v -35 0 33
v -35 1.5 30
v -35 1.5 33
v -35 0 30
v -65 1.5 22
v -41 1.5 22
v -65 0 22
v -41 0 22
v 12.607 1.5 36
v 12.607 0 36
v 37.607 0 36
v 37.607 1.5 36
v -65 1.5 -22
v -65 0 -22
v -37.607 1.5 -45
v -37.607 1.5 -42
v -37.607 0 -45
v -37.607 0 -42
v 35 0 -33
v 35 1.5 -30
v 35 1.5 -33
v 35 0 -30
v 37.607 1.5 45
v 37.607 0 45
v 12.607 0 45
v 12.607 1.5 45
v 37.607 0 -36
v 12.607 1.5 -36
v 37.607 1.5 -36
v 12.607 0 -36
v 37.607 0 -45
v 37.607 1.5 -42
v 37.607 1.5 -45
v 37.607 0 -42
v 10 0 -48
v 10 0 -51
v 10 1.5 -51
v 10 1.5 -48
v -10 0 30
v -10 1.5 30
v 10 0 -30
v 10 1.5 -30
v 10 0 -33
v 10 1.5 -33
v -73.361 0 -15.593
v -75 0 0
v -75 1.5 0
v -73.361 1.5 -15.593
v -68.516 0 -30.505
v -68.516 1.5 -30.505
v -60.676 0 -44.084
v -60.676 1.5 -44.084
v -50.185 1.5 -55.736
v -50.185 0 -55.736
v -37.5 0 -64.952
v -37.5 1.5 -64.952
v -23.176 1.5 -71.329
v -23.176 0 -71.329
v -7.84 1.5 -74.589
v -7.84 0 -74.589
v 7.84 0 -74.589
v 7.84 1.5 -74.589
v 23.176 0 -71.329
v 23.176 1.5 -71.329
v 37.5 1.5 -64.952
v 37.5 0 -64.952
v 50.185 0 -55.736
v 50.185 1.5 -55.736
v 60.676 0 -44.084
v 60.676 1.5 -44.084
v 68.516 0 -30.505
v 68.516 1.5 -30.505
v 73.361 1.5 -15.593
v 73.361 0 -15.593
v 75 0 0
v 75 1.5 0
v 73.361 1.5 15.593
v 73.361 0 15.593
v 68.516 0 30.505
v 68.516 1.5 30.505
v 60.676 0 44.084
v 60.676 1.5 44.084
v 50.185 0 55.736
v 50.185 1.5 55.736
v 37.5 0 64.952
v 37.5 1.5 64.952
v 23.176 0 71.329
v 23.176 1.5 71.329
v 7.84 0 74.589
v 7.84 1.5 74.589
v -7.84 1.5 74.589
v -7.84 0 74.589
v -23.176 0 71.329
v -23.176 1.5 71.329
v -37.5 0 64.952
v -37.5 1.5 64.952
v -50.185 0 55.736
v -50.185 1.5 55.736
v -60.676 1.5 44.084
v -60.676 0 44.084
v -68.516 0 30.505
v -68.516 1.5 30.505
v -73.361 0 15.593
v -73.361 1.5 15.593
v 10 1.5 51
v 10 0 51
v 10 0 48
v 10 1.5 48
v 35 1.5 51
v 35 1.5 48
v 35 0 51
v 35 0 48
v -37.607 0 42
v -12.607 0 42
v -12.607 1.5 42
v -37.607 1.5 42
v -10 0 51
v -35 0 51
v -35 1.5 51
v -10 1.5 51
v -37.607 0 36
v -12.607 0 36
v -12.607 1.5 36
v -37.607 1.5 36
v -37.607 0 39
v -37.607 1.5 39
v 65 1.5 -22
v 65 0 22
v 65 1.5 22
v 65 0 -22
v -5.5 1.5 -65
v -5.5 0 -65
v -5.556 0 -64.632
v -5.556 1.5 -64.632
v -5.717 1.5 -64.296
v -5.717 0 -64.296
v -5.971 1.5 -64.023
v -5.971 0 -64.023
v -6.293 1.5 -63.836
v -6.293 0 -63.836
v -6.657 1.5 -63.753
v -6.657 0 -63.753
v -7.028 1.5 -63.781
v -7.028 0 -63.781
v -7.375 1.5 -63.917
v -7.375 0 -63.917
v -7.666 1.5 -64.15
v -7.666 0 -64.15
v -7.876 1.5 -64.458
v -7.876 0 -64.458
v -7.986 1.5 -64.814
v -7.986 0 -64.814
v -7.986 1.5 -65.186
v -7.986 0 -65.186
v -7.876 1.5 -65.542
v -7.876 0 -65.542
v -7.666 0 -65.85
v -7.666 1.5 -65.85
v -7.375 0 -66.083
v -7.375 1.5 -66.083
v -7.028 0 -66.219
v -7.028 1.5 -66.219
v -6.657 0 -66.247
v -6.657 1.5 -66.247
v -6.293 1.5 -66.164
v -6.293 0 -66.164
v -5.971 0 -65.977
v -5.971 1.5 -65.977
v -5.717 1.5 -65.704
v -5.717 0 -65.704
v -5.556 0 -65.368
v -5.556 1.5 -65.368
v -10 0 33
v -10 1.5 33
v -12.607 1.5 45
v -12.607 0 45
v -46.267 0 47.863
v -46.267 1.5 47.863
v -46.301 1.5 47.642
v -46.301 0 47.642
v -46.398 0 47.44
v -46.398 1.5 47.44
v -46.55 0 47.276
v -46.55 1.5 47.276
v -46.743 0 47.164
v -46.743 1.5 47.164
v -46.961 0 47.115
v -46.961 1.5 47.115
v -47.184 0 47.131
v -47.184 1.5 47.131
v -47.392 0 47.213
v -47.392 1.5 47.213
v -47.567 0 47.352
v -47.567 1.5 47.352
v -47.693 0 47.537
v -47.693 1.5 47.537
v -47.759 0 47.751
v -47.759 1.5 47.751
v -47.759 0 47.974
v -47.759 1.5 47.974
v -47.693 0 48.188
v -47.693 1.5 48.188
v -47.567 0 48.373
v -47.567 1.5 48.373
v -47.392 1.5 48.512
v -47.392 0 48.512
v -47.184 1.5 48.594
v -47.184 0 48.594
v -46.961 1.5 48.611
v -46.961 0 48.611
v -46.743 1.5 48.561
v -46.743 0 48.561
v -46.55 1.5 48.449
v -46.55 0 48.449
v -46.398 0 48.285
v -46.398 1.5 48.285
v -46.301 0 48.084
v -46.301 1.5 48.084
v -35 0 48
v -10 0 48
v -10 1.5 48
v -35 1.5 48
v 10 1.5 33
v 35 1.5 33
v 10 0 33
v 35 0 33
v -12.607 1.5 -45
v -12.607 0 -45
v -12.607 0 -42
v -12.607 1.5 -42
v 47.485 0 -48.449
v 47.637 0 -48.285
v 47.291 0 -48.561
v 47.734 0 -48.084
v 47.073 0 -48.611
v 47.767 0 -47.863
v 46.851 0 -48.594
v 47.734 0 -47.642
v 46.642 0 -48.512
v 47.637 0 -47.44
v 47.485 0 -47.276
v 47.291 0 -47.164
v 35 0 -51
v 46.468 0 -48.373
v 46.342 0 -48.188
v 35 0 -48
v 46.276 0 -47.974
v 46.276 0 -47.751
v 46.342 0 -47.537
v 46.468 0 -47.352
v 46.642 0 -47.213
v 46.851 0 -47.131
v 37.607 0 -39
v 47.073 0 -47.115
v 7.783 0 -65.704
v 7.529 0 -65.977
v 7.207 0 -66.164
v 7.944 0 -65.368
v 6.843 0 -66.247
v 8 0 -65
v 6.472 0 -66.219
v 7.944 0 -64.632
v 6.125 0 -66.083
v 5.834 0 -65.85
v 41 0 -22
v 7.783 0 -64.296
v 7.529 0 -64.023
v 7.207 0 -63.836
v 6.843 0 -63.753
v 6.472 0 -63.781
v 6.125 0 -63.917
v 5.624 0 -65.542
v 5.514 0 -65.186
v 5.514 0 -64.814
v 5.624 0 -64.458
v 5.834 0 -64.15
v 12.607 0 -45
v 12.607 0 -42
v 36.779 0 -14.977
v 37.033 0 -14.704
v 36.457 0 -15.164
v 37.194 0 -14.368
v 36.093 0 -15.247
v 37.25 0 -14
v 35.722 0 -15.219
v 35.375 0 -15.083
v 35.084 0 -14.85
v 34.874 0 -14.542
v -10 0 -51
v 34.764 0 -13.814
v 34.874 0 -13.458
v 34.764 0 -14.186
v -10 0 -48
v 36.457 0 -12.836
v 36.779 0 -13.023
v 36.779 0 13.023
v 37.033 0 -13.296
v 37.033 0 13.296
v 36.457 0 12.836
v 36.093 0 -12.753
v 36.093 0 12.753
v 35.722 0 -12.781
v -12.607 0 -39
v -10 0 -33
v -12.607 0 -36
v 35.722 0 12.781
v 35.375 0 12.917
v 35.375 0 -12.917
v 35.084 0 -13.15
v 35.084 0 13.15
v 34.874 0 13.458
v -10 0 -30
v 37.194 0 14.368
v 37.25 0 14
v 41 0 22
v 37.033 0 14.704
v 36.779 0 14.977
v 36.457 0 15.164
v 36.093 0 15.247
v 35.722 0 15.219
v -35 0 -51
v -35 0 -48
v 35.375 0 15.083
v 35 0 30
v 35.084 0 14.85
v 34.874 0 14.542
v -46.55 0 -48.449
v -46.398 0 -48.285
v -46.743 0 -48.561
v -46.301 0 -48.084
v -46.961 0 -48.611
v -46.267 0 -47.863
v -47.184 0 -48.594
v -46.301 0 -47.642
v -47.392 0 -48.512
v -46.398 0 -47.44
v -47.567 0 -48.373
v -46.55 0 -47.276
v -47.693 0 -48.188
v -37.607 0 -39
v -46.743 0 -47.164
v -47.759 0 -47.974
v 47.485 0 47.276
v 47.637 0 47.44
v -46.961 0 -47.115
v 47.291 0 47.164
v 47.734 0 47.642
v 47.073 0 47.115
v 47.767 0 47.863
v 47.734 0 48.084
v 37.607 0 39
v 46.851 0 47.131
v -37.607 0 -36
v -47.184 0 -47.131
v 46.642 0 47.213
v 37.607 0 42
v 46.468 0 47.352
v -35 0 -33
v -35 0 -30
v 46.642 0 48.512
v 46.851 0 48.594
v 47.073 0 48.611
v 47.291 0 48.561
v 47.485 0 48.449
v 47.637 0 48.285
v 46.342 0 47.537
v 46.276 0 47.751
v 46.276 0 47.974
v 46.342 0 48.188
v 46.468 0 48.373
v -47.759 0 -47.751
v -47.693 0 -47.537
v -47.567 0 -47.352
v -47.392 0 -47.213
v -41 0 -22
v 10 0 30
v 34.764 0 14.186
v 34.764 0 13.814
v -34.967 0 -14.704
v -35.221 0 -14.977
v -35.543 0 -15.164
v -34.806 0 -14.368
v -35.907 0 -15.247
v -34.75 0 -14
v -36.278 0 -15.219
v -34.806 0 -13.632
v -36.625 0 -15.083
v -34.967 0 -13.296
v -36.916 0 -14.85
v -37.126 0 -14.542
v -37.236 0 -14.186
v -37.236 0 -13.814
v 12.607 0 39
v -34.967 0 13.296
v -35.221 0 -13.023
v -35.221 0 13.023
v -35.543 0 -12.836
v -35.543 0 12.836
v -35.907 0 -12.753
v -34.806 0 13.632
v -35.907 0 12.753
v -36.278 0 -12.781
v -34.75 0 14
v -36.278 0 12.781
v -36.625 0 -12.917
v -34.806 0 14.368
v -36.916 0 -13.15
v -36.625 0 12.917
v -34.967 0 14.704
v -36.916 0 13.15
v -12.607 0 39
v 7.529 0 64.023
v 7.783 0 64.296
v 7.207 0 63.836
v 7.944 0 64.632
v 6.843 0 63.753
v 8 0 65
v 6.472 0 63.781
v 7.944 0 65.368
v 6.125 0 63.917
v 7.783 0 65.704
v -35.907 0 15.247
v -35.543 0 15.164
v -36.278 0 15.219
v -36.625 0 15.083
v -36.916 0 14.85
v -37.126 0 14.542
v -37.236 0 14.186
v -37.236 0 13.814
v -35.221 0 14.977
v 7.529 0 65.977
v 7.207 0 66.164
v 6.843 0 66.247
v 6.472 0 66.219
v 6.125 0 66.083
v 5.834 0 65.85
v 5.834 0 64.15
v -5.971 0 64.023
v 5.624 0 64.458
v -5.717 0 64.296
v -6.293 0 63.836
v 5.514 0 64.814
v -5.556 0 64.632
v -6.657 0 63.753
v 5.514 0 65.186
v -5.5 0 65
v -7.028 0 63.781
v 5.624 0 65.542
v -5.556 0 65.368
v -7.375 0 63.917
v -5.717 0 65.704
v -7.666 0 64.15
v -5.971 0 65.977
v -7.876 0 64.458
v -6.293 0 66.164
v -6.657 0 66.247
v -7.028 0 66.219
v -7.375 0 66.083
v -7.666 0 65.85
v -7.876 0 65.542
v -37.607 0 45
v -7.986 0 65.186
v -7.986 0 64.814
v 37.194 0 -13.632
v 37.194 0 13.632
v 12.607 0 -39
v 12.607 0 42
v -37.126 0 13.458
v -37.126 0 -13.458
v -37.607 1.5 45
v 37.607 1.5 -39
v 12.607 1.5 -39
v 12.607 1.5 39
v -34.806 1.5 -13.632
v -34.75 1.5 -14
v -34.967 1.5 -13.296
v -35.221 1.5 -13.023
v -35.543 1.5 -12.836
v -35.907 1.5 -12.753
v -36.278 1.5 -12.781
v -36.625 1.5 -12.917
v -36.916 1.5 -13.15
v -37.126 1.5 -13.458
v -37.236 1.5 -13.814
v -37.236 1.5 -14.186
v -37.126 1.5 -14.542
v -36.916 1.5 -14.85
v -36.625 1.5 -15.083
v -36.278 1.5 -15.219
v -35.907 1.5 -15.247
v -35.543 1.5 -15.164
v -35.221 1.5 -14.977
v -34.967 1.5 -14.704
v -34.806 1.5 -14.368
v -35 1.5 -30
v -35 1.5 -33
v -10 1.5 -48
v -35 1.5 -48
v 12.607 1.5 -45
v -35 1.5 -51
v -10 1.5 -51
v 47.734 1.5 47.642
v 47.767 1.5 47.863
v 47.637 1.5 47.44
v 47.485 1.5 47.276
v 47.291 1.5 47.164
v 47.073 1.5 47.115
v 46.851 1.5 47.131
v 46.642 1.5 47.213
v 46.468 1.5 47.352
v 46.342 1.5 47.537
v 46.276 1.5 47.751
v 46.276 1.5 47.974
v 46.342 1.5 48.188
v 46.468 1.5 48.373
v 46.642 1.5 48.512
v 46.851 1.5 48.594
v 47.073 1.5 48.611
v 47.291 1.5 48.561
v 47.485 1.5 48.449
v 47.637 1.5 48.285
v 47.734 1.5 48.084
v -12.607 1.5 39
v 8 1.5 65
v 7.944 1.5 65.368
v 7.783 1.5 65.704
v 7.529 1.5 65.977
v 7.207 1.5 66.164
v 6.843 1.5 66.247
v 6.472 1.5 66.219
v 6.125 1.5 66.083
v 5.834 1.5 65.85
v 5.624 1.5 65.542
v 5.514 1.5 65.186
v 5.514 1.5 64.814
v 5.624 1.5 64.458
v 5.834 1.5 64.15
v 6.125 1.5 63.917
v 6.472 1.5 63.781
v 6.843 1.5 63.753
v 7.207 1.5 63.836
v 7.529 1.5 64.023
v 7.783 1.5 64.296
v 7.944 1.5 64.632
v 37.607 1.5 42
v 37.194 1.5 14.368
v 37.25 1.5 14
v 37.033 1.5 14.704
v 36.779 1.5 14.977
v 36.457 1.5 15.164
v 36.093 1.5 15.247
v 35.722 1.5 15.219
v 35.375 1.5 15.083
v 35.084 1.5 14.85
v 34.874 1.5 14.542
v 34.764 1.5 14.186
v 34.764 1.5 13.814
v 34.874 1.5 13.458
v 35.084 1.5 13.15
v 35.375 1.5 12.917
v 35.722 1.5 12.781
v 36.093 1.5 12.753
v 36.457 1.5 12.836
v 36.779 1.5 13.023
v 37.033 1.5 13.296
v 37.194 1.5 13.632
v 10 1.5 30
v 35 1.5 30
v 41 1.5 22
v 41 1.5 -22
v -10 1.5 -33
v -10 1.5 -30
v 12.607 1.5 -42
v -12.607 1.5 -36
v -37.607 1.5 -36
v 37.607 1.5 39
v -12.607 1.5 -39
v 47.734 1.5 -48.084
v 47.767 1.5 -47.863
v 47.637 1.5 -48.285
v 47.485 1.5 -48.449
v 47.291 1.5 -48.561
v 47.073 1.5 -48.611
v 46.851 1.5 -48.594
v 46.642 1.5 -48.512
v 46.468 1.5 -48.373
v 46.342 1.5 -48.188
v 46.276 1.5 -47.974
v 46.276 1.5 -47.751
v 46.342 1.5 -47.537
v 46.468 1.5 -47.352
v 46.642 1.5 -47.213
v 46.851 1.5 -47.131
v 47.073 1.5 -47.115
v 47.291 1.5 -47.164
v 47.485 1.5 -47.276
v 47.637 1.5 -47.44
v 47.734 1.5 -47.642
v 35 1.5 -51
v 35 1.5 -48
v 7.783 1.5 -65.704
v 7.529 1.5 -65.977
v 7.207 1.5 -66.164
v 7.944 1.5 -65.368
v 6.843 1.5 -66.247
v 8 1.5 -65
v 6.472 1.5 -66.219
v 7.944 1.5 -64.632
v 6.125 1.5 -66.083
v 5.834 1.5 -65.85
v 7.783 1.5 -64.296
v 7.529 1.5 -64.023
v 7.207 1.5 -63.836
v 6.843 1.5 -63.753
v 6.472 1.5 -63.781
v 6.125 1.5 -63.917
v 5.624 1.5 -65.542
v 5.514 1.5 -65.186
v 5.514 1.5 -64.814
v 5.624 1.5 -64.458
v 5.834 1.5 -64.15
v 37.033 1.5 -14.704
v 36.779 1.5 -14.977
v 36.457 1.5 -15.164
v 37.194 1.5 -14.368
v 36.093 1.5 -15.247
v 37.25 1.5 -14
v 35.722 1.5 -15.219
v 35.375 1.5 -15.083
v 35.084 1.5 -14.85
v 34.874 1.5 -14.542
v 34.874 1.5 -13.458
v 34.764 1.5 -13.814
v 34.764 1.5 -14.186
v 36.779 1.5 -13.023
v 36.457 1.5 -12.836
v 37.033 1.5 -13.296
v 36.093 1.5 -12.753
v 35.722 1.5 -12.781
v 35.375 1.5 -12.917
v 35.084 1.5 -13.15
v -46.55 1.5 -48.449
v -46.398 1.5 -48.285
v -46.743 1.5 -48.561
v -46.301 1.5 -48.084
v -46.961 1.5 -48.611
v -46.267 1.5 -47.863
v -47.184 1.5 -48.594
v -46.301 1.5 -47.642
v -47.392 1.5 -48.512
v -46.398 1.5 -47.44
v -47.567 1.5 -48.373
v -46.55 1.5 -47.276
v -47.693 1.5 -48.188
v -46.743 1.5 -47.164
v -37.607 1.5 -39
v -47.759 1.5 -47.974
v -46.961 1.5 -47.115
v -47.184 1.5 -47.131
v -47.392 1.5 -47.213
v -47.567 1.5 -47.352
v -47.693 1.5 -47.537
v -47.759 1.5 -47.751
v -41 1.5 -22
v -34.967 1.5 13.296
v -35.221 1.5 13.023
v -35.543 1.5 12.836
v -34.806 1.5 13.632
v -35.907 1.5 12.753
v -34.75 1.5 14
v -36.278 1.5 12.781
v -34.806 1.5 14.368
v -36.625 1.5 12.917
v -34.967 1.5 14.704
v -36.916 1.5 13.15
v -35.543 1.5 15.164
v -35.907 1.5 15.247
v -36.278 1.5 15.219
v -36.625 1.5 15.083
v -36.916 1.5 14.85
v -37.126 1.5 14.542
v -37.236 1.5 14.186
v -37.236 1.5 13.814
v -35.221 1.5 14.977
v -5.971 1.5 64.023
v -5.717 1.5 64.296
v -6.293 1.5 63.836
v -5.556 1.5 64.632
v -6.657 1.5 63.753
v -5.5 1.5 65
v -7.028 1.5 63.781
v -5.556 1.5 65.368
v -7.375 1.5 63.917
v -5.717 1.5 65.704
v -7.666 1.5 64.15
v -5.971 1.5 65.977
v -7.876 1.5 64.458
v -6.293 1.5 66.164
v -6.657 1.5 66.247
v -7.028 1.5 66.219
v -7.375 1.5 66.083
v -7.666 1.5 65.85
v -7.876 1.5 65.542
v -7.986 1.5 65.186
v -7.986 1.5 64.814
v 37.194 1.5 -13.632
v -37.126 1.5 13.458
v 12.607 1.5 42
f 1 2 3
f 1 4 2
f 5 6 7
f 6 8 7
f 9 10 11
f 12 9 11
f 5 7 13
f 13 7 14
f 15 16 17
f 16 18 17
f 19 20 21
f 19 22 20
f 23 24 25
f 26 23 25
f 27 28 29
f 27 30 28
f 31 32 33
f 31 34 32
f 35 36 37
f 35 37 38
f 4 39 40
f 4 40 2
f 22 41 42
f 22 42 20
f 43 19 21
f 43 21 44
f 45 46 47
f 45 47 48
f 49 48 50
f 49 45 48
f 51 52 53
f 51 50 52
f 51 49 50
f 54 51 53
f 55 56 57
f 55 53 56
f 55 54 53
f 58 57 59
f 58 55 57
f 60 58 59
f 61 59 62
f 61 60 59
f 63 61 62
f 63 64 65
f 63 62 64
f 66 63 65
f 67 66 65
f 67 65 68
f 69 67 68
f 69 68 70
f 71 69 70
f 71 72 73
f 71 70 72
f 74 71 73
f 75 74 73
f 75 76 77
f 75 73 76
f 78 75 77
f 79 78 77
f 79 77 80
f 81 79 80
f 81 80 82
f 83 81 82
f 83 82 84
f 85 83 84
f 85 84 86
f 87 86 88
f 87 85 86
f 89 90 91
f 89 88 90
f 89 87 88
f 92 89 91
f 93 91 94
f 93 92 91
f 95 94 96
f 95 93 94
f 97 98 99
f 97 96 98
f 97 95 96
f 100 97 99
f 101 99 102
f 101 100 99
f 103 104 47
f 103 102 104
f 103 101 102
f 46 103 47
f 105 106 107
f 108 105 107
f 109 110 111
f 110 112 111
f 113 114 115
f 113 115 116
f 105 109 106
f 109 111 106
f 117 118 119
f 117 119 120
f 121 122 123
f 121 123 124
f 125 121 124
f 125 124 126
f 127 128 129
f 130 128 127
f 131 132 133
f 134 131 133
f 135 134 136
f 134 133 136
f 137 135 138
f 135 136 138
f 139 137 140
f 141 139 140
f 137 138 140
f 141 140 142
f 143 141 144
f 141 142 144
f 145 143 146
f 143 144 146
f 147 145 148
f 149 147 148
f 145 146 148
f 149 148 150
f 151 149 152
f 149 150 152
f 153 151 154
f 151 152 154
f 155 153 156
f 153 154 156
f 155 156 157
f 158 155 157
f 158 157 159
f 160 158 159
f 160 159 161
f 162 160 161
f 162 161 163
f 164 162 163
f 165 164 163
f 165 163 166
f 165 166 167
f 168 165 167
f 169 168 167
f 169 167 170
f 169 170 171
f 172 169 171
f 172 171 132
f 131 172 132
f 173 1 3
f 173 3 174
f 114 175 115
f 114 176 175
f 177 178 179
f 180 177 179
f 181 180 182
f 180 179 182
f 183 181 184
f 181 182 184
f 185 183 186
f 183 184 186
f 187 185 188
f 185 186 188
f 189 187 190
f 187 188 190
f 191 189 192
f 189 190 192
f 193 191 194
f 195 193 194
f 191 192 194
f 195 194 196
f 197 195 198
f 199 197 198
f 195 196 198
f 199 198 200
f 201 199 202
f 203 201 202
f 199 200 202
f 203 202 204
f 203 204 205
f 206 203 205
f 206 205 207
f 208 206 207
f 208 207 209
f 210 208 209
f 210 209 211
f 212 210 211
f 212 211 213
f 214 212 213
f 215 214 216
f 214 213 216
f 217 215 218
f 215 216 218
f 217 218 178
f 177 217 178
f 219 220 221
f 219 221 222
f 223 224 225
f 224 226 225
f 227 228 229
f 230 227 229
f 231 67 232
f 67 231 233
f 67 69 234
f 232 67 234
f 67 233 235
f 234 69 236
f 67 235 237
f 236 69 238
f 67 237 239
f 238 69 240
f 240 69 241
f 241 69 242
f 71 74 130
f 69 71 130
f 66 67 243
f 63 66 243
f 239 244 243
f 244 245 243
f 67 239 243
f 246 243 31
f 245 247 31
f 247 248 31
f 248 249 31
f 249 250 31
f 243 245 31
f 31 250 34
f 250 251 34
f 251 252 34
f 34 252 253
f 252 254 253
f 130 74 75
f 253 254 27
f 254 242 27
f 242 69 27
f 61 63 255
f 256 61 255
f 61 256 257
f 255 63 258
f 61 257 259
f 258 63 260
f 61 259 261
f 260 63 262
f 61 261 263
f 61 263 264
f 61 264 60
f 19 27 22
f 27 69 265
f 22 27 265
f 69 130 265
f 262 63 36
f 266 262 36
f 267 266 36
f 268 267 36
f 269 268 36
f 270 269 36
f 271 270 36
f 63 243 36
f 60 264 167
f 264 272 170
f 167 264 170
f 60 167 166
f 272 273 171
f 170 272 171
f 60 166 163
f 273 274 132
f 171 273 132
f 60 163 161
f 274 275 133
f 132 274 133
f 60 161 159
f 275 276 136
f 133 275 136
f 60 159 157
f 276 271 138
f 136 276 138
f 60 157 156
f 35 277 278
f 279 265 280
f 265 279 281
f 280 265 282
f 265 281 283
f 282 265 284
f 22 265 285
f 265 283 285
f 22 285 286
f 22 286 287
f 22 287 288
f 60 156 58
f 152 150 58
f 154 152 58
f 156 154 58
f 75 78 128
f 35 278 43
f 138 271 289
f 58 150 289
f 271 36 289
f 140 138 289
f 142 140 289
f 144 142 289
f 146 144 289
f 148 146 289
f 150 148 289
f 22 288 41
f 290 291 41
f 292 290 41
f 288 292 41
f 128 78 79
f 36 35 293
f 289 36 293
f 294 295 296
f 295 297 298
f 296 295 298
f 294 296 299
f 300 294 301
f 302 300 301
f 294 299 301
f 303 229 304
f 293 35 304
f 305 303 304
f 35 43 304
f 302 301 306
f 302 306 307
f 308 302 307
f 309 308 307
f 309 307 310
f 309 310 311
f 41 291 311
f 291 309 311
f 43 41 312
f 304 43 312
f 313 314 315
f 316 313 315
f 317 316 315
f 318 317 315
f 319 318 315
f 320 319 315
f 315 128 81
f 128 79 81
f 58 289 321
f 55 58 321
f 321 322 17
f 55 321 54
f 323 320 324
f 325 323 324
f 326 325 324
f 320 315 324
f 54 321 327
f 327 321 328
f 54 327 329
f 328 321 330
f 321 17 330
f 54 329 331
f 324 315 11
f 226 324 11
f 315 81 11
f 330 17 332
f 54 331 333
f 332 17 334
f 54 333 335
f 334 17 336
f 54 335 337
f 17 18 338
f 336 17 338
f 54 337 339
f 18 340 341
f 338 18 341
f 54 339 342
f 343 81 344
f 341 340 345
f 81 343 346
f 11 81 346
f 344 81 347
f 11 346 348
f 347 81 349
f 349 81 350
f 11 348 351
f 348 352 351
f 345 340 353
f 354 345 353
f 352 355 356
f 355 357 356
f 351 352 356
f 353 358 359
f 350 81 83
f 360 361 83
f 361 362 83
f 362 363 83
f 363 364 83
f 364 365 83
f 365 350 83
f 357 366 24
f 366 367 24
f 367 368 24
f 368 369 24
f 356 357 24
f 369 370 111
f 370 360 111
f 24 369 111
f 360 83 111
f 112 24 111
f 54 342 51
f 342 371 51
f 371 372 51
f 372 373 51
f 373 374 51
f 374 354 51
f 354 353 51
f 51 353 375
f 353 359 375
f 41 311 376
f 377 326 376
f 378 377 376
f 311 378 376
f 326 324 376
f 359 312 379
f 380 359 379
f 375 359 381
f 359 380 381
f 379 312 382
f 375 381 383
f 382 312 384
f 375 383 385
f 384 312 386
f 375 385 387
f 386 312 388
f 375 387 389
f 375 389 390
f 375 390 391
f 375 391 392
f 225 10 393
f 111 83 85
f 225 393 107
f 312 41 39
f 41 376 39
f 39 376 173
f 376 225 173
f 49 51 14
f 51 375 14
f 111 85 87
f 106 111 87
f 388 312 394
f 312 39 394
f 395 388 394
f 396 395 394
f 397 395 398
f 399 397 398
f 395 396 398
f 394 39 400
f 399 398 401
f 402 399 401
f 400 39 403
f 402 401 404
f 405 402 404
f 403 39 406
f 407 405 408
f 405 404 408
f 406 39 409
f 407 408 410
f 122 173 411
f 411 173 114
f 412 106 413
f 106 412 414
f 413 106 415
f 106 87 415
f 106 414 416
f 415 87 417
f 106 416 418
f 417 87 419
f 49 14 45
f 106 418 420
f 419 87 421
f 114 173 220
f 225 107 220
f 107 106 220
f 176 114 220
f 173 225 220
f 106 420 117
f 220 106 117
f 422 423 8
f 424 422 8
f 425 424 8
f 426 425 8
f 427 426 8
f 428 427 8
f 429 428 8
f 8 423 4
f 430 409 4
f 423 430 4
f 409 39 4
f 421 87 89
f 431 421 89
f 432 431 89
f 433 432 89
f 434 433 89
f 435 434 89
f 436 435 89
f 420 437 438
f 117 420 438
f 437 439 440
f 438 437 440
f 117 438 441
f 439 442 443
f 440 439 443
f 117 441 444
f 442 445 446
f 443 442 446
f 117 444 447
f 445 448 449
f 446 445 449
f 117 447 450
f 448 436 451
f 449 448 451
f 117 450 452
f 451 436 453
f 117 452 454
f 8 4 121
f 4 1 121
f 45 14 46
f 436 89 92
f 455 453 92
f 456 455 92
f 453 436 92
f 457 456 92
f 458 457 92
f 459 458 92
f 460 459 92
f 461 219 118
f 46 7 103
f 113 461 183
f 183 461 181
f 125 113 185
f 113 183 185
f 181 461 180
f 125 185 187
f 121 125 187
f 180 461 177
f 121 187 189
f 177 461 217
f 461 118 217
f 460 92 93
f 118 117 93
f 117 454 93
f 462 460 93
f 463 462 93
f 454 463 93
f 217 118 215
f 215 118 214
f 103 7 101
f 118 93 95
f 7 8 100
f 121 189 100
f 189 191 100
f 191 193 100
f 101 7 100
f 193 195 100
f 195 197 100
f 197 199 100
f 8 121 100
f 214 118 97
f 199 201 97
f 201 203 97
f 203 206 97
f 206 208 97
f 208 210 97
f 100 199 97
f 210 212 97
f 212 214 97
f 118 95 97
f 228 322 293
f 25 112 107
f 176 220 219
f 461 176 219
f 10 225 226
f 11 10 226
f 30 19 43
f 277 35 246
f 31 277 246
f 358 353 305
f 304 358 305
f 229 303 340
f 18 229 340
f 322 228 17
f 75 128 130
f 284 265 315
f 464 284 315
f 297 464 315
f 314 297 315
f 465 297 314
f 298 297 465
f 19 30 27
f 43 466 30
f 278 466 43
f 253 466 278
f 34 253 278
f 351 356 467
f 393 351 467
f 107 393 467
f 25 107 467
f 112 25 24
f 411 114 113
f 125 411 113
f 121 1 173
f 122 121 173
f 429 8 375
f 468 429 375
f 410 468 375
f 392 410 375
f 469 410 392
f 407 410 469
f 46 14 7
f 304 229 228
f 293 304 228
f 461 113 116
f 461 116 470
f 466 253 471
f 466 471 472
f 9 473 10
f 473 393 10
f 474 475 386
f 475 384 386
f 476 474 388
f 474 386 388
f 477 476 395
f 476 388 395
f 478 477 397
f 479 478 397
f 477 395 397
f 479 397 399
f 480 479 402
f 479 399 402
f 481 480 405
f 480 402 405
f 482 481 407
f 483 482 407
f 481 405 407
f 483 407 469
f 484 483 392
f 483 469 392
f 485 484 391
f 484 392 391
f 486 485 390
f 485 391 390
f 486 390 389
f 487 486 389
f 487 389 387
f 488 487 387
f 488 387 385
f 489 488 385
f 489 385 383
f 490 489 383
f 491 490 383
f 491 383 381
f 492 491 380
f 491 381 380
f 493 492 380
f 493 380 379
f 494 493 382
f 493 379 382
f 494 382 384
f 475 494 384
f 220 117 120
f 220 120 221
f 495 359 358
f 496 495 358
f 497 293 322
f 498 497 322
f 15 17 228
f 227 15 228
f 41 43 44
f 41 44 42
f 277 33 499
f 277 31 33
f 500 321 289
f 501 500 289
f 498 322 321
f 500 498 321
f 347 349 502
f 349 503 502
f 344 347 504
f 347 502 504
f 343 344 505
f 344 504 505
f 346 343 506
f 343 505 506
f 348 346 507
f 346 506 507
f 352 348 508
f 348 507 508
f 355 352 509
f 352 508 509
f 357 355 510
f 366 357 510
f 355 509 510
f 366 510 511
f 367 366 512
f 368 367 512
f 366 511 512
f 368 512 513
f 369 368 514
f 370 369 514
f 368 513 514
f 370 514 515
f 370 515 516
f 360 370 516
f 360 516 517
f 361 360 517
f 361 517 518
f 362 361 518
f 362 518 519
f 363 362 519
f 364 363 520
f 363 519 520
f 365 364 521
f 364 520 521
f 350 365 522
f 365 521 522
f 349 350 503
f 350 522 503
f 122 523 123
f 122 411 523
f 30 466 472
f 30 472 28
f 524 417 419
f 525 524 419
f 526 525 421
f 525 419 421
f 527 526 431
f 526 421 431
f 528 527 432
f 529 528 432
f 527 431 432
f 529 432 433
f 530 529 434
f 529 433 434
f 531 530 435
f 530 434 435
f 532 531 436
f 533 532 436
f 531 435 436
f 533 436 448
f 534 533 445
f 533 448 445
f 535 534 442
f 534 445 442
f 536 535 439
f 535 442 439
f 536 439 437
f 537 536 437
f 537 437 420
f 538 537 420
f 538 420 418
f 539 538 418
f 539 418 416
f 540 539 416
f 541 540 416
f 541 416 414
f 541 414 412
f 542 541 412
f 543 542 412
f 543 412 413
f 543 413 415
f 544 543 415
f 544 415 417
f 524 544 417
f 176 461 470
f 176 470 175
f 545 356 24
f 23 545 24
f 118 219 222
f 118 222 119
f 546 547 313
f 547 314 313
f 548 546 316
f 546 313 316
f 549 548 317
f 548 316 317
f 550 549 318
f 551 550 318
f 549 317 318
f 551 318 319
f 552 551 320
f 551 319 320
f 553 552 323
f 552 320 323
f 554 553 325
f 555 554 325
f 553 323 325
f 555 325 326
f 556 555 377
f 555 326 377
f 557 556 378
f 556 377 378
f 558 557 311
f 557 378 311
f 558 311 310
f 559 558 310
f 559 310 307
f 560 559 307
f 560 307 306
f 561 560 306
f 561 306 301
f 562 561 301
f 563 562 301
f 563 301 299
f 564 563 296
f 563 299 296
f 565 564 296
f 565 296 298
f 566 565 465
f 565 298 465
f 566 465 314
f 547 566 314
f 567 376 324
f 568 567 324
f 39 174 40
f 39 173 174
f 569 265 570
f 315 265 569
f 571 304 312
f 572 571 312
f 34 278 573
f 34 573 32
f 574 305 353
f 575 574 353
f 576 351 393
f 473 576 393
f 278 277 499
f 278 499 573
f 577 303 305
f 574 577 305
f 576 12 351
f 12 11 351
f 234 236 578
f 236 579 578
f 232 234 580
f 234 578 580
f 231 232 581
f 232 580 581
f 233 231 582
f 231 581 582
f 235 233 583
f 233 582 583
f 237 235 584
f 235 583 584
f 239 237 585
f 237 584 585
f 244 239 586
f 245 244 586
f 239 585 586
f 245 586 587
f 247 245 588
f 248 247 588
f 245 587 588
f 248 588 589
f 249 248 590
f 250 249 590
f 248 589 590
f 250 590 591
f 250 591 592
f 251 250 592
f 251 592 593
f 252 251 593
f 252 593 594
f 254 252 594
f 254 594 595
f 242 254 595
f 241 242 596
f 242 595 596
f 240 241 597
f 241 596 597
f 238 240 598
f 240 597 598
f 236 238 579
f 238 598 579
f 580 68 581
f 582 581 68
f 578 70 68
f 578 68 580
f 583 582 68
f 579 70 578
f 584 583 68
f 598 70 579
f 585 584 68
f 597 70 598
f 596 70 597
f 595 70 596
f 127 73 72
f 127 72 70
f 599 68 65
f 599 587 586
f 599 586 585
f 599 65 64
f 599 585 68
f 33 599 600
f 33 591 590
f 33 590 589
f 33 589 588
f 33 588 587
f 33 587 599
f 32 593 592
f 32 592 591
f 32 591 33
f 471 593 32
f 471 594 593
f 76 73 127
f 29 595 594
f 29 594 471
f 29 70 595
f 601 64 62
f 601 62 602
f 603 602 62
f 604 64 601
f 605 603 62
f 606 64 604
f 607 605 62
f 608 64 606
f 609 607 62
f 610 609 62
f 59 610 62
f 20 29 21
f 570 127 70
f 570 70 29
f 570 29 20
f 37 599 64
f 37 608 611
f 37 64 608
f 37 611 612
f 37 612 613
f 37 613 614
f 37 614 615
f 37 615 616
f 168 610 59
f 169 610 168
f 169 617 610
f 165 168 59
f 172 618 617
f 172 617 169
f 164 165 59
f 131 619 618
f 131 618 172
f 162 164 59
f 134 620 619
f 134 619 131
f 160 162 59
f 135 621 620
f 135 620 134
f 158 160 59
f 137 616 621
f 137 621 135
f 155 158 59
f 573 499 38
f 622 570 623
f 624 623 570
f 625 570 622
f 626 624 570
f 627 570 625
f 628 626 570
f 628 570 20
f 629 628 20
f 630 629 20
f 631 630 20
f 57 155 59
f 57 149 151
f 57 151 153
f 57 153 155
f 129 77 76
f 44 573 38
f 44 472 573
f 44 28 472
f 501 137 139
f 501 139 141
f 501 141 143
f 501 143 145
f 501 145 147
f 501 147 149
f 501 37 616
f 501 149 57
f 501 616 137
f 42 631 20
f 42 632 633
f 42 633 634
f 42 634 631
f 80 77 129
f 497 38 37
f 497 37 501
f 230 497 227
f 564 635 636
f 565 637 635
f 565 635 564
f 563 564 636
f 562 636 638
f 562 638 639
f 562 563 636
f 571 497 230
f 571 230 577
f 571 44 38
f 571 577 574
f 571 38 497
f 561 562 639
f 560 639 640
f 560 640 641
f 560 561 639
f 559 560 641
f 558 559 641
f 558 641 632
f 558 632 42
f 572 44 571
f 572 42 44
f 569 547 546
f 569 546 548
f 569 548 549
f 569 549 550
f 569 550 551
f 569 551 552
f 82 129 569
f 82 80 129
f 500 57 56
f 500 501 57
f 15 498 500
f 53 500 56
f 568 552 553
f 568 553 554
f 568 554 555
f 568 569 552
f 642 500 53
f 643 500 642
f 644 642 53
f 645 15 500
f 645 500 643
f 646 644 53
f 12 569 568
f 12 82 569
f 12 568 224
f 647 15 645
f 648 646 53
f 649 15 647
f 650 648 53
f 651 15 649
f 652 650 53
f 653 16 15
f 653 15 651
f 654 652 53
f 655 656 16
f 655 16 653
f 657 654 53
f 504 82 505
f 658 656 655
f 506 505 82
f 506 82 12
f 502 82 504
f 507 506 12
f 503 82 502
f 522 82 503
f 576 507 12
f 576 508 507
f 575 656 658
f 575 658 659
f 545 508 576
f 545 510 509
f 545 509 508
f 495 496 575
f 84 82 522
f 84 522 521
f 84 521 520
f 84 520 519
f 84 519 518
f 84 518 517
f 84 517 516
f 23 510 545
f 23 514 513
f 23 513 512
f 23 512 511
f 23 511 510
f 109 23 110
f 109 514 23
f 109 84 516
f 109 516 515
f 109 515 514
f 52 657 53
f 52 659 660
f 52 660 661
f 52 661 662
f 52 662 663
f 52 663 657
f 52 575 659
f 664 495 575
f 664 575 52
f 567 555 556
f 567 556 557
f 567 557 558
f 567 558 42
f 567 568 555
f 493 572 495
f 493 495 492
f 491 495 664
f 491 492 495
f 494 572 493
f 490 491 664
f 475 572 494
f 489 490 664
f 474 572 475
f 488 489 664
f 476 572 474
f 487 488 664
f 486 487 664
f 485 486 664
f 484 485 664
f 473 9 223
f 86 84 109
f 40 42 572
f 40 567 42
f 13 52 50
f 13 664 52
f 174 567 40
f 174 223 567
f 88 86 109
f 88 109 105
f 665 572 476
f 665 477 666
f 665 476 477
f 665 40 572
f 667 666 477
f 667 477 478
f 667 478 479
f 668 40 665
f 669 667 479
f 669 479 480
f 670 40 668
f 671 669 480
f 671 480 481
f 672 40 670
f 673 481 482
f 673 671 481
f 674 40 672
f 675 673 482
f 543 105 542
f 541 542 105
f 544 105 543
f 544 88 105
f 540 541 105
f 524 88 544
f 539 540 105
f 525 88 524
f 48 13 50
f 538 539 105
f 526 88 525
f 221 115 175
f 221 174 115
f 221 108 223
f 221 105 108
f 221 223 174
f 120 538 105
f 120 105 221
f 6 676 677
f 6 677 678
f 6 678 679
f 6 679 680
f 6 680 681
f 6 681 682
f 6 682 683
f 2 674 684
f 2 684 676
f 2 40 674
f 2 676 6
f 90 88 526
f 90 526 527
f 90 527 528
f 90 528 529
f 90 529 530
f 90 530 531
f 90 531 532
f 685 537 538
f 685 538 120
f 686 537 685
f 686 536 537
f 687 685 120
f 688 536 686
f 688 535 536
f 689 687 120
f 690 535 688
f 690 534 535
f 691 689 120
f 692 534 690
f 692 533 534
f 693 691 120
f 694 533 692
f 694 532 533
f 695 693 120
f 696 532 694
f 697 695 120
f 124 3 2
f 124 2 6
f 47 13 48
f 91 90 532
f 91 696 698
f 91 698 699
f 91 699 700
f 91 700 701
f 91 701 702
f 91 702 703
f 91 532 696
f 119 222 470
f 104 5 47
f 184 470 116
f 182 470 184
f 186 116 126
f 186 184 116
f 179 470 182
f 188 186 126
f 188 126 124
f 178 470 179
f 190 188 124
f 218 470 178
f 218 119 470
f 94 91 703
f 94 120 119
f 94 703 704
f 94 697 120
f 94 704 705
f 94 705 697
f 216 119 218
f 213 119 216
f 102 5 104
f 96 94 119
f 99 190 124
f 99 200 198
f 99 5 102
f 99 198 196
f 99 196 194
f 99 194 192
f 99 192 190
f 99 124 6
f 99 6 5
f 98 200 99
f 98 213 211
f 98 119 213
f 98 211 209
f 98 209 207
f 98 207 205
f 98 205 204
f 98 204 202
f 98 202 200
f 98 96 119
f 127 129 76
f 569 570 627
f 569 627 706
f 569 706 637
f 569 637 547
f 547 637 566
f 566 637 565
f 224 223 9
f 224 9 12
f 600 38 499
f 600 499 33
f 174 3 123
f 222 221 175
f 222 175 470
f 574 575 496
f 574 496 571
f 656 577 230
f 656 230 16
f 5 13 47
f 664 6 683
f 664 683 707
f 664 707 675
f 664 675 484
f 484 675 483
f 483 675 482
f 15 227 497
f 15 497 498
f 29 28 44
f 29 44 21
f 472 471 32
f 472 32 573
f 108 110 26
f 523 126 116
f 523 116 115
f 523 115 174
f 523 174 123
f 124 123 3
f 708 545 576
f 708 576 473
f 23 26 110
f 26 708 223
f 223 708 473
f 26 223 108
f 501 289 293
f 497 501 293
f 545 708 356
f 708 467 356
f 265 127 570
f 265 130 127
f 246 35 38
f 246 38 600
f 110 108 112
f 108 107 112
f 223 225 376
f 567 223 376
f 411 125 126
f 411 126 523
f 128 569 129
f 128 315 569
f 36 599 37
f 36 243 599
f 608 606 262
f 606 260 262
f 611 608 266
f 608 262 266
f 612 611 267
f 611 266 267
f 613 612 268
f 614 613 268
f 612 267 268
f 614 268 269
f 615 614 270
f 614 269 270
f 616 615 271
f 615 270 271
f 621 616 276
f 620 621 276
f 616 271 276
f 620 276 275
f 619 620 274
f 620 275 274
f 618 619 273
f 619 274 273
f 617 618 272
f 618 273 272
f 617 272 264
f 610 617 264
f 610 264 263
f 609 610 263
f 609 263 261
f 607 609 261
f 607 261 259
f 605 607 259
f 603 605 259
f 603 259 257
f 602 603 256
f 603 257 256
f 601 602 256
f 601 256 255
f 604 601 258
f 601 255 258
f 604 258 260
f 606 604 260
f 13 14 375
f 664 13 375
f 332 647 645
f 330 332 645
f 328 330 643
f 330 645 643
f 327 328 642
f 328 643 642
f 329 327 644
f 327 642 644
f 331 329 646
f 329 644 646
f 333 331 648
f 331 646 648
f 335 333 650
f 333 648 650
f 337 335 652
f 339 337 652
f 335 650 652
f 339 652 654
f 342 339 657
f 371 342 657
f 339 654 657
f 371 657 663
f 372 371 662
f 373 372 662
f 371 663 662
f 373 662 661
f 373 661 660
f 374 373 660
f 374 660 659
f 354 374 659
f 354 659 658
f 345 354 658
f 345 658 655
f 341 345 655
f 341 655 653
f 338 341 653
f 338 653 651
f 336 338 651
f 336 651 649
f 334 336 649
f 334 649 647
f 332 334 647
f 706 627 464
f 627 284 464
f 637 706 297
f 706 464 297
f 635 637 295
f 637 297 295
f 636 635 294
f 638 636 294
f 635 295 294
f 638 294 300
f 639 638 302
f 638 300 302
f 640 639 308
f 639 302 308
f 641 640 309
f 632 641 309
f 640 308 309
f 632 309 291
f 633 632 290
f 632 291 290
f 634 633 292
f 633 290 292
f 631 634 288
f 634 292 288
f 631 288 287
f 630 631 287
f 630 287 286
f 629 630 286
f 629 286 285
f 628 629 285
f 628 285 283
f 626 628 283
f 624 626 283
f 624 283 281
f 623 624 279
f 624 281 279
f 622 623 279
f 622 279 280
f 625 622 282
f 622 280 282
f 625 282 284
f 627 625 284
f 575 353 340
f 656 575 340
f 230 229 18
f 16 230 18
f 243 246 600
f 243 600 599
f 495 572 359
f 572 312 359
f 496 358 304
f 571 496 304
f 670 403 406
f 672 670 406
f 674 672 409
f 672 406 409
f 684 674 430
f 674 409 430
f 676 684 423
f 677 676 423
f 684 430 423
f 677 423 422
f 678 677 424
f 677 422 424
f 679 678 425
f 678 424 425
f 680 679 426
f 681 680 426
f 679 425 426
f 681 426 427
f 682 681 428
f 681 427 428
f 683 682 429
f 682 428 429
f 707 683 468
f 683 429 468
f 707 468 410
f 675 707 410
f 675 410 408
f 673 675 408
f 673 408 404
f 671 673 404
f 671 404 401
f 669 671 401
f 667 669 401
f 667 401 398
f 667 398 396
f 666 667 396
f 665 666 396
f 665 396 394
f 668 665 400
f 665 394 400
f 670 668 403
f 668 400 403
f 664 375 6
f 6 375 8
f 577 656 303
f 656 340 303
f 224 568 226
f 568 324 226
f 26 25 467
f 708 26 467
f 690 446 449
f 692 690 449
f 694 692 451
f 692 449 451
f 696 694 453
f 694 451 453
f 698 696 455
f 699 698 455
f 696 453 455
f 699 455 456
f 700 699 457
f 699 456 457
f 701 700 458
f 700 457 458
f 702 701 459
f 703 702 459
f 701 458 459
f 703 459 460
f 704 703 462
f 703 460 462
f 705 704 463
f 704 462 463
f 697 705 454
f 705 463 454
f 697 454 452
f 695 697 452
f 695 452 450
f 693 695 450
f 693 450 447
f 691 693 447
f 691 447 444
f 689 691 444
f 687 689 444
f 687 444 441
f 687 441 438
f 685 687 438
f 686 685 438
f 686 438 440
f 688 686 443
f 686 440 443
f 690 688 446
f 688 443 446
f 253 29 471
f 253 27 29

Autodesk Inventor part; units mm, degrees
ref_plane "YZ Plane" through (0, 0, 0) normal (1, 0, 0) x (0, 1, 0)
ref_plane "XZ Plane" through (0, 0, 0) normal (0, 1, 0) x (-1, 0, 0)
ref_plane "XY Plane" through (0, 0, 0) normal (0, 0, 1) x (1, 0, 0)
sketch "Boceto1" plane through (0, 0, 0) normal (0, 1, 0) x (-1, 0, 0)
  circle A0 centre (0, 0) radius 75
  line L0 (65, -22) -> (41, -22)
  line L1 (41, -22) -> (41, 22)
  line L2 (41, 22) -> (65, 22)
  line L3 (65, 22) -> (65, -22)
  line L4 (37.6072, -39) -> (12.6072, -39)
  line L5 (12.6072, -39) -> (12.6072, -36)
  line L6 (12.6072, -36) -> (37.6072, -36)
  line L7 (37.6072, -36) -> (37.6072, -39)
  line L8 (37.6072, -45) -> (12.6072, -45)
  line L9 (12.6072, -45) -> (12.6072, -42)
  line L10 (12.6072, -42) -> (37.6072, -42)
  line L11 (37.6072, -42) -> (37.6072, -45)
  line L12 (35, -51) -> (10, -51)
  line L13 (10, -51) -> (10, -48)
  line L14 (10, -48) -> (35, -48)
  line L15 (35, -48) -> (35, -51)
  line L16 (35, -33) -> (10, -33)
  line L17 (10, -33) -> (10, -30)
  line L18 (10, -30) -> (35, -30)
  line L19 (35, -30) -> (35, -33)
  line L20 (-37.6072, -39) -> (-12.6072, -39)
  line L21 (-12.6072, -39) -> (-12.6072, -36)
  line L22 (-12.6072, -36) -> (-37.6072, -36)
  line L23 (-37.6072, -36) -> (-37.6072, -39)
  line L24 (-37.6072, -45) -> (-12.6072, -45)
  line L25 (-37.6072, -42) -> (-37.6072, -45)
  line L26 (-12.6072, -42) -> (-37.6072, -42)
  line L27 (-12.6072, -45) -> (-12.6072, -42)
  line L28 (-35, -51) -> (-10, -51)
  line L29 (-35, -48) -> (-35, -51)
  line L30 (-10, -48) -> (-35, -48)
  line L31 (-10, -51) -> (-10, -48)
  line L32 (-35, -33) -> (-10, -33)
  line L33 (-35, -30) -> (-35, -33)
  line L34 (-10, -30) -> (-35, -30)
  line L35 (-10, -33) -> (-10, -30)
  line L36 (-65, -22) -> (-41, -22)
  line L37 (-41, -22) -> (-41, 22)
  line L38 (-41, 22) -> (-65, 22)
  line L39 (-65, 22) -> (-65, -22)
  line L40 (37.6072, 39) -> (12.6072, 39)
  line L41 (12.6072, 39) -> (12.6072, 36)
  line L42 (12.6072, 36) -> (37.6072, 36)
  line L43 (37.6072, 36) -> (37.6072, 39)
  line L44 (37.6072, 45) -> (12.6072, 45)
  line L45 (37.6072, 42) -> (37.6072, 45)
  line L46 (12.6072, 42) -> (37.6072, 42)
  line L47 (12.6072, 45) -> (12.6072, 42)
  line L48 (35, 51) -> (10, 51)
  line L49 (35, 48) -> (35, 51)
  line L50 (10, 48) -> (35, 48)
  line L51 (10, 51) -> (10, 48)
  line L52 (35, 33) -> (10, 33)
  line L53 (35, 30) -> (35, 33)
  line L54 (10, 30) -> (35, 30)
  line L55 (10, 33) -> (10, 30)
  line L56 (-35, 30) -> (-35, 33)
  line L57 (-10, 33) -> (-10, 30)
  line L58 (-10, 30) -> (-35, 30)
  line L59 (-35, 33) -> (-10, 33)
  line L60 (-12.6072, 39) -> (-12.6072, 36)
  line L61 (-12.6072, 36) -> (-37.6072, 36)
  line L62 (-37.6072, 36) -> (-37.6072, 39)
  line L63 (-37.6072, 39) -> (-12.6072, 39)
  line L64 (-12.6072, 45) -> (-12.6072, 42)
  line L65 (-12.6072, 42) -> (-37.6072, 42)
  line L66 (-37.6072, 45) -> (-12.6072, 45)
  line L67 (-10, 48) -> (-35, 48)
  line L68 (-35, 51) -> (-10, 51)
  line L69 (-10, 51) -> (-10, 48)
  line L70 (-37.6072, 42) -> (-37.6072, 45)
  line L71 (-35, 48) -> (-35, 51)
  point P0 (0, 25.3749)
  dimension "d0" = 150
  dimension "d1" = 24
  dimension "d2" = 44
  dimension "d3" = 10
  dimension "d4" = 25
  dimension "d5" = 3
  dimension "d6" = 25
  dimension "d7" = 3
  dimension "d8" = 25
  dimension "d9" = 3
  dimension "d10" = 25
  dimension "d11" = 3
  dimension "d12" = 3
  dimension "d13" = 3
  dimension "d14" = 3
  dimension "d15" = 0
extrude "Extrusión1" add sketch "Boceto1" along normal blind 1.5
sketch "Boceto2" plane through (0, 1.5, 0) normal (0, 1, 0) x (1, 0, 0)
  line L0 (0, 0) -> (0, -9.9603)
  line L1 (0, 0) -> (61.7788, -62.8893)
  circle A0 centre (47.0174, -47.8626) radius 0.75
  arc A1 (50.5529, -44.327) -> (43.5135, -51.4295) centre (47.0174, -47.8626) ccw
  line L2 (-72.438, 0) -> (-75, 0)
  circle A2 centre (0, 0) radius 72.438
  line L3 (44.0781, -44.8705) -> (47.0174, -47.8626)
  line L4 (43.4505, -51.3665) -> (48.0344, -55.9504)
  line L5 (43.4505, -51.3665) -> (49.9332, -51.3665) construction
  line L6 (47.0174, -47.8626) -> (52.0174, -47.8626) construction
  line L7 (50.5529, -44.327) -> (55.1054, -48.8795)
  line L8 (55.1054, -48.8795) -> (48.0344, -55.9504)
  circle A3 centre (-47.0174, -47.8626) radius 0.75
  arc A4 (-43.5135, -51.4295) -> (-50.5529, -44.327) centre (-47.0174, -47.8626) ccw
  line L9 (-44.0781, -44.8705) -> (-47.0174, -47.8626)
  line L10 (-43.4505, -51.3665) -> (-48.0344, -55.9504)
  line L11 (-43.4505, -51.3665) -> (-49.9332, -51.3665) construction
  line L12 (-47.0174, -47.8626) -> (-52.0174, -47.8626) construction
  line L13 (-50.5529, -44.327) -> (-55.1054, -48.8795)
  line L14 (-55.1054, -48.8795) -> (-48.0344, -55.9504)
  line L15 (0, 0) -> (7.916, 0)
  line L16 (-44.0781, 44.8705) -> (-47.0174, 47.8626)
  circle A5 centre (-47.0174, 47.8626) radius 0.75
  line L17 (-43.4505, 51.3665) -> (-49.9332, 51.3665) construction
  arc A6 (-50.5529, 44.327) -> (-43.5135, 51.4295) centre (-47.0174, 47.8626) ccw
  line L18 (-43.4505, 51.3665) -> (-48.0344, 55.9504)
  line L19 (-47.0174, 47.8626) -> (-52.0174, 47.8626) construction
  line L20 (-50.5529, 44.327) -> (-55.1054, 48.8795)
  line L21 (-55.1054, 48.8795) -> (-48.0344, 55.9504)
  line L22 (0, 0) -> (61.7788, 62.8893)
  circle A7 centre (0, 0) radius 72.438
  circle A8 centre (47.0174, 47.8626) radius 0.75
  arc A9 (43.5135, 51.4295) -> (50.5529, 44.327) centre (47.0174, 47.8626) ccw
  line L23 (44.0781, 44.8705) -> (47.0174, 47.8626)
  line L24 (43.4505, 51.3665) -> (48.0344, 55.9504)
  line L25 (47.0174, 47.8626) -> (52.0174, 47.8626) construction
  line L26 (55.1054, 48.8795) -> (48.0344, 55.9504)
  line L27 (50.5529, 44.327) -> (55.1054, 48.8795)
  line L28 (43.4505, 51.3665) -> (49.9332, 51.3665) construction
  dimension "d26" = 1.5
  dimension "d27" = 45
  dimension "d28" = 44.49
  dimension "d29" = 45.51
extrude "Extrusión2" cut sketch "Boceto2" against normal blind 10 contours A0 L1 | L1 A0 | A8 L22 | L22 A8 | A3 | A5
sketch "Boceto3" plane through (0, 0, 0) normal (0, -1, 0) x (1, 0, 0)
  line L0 (0, 0) -> (0, 96.9999)
  line L1 (0, 0) -> (57.8177, 0)
  circle A0 centre (6.75, 65) radius 1.25
  circle A1 centre (-6.75, 65) radius 1.25
  circle A2 centre (6.75, -65) radius 1.25
  circle A3 centre (-6.75, -65) radius 1.25
  dimension "d32" = 2.5
  dimension "d33" = 6.75
  dimension "d34" = 65
extrude "Extrusión3" cut sketch "Boceto3" against normal blind 10
sketch "Boceto4" plane through (0, 0, 0) normal (0, -1, 0) x (1, 0, 0)
  circle A0 centre (-36, 14) radius 1.25
  line L0 (0, 0) -> (0, 13.2611)
  line L1 (0, 0) -> (12.4525, 0)
  circle A1 centre (36, 14) radius 1.25
  circle A2 centre (-36, -14) radius 1.25
  circle A3 centre (36, -14) radius 1.25
  line L2 (-41, 22) -> (-41, -22) projected
  point P0 (0, -13.2611)
  dimension "d37" = 2.5
  dimension "d38" = 14
  dimension "d39" = 5
extrude "Extrusión4" cut sketch "Boceto4" against normal blind 10
properties part number "Base"
